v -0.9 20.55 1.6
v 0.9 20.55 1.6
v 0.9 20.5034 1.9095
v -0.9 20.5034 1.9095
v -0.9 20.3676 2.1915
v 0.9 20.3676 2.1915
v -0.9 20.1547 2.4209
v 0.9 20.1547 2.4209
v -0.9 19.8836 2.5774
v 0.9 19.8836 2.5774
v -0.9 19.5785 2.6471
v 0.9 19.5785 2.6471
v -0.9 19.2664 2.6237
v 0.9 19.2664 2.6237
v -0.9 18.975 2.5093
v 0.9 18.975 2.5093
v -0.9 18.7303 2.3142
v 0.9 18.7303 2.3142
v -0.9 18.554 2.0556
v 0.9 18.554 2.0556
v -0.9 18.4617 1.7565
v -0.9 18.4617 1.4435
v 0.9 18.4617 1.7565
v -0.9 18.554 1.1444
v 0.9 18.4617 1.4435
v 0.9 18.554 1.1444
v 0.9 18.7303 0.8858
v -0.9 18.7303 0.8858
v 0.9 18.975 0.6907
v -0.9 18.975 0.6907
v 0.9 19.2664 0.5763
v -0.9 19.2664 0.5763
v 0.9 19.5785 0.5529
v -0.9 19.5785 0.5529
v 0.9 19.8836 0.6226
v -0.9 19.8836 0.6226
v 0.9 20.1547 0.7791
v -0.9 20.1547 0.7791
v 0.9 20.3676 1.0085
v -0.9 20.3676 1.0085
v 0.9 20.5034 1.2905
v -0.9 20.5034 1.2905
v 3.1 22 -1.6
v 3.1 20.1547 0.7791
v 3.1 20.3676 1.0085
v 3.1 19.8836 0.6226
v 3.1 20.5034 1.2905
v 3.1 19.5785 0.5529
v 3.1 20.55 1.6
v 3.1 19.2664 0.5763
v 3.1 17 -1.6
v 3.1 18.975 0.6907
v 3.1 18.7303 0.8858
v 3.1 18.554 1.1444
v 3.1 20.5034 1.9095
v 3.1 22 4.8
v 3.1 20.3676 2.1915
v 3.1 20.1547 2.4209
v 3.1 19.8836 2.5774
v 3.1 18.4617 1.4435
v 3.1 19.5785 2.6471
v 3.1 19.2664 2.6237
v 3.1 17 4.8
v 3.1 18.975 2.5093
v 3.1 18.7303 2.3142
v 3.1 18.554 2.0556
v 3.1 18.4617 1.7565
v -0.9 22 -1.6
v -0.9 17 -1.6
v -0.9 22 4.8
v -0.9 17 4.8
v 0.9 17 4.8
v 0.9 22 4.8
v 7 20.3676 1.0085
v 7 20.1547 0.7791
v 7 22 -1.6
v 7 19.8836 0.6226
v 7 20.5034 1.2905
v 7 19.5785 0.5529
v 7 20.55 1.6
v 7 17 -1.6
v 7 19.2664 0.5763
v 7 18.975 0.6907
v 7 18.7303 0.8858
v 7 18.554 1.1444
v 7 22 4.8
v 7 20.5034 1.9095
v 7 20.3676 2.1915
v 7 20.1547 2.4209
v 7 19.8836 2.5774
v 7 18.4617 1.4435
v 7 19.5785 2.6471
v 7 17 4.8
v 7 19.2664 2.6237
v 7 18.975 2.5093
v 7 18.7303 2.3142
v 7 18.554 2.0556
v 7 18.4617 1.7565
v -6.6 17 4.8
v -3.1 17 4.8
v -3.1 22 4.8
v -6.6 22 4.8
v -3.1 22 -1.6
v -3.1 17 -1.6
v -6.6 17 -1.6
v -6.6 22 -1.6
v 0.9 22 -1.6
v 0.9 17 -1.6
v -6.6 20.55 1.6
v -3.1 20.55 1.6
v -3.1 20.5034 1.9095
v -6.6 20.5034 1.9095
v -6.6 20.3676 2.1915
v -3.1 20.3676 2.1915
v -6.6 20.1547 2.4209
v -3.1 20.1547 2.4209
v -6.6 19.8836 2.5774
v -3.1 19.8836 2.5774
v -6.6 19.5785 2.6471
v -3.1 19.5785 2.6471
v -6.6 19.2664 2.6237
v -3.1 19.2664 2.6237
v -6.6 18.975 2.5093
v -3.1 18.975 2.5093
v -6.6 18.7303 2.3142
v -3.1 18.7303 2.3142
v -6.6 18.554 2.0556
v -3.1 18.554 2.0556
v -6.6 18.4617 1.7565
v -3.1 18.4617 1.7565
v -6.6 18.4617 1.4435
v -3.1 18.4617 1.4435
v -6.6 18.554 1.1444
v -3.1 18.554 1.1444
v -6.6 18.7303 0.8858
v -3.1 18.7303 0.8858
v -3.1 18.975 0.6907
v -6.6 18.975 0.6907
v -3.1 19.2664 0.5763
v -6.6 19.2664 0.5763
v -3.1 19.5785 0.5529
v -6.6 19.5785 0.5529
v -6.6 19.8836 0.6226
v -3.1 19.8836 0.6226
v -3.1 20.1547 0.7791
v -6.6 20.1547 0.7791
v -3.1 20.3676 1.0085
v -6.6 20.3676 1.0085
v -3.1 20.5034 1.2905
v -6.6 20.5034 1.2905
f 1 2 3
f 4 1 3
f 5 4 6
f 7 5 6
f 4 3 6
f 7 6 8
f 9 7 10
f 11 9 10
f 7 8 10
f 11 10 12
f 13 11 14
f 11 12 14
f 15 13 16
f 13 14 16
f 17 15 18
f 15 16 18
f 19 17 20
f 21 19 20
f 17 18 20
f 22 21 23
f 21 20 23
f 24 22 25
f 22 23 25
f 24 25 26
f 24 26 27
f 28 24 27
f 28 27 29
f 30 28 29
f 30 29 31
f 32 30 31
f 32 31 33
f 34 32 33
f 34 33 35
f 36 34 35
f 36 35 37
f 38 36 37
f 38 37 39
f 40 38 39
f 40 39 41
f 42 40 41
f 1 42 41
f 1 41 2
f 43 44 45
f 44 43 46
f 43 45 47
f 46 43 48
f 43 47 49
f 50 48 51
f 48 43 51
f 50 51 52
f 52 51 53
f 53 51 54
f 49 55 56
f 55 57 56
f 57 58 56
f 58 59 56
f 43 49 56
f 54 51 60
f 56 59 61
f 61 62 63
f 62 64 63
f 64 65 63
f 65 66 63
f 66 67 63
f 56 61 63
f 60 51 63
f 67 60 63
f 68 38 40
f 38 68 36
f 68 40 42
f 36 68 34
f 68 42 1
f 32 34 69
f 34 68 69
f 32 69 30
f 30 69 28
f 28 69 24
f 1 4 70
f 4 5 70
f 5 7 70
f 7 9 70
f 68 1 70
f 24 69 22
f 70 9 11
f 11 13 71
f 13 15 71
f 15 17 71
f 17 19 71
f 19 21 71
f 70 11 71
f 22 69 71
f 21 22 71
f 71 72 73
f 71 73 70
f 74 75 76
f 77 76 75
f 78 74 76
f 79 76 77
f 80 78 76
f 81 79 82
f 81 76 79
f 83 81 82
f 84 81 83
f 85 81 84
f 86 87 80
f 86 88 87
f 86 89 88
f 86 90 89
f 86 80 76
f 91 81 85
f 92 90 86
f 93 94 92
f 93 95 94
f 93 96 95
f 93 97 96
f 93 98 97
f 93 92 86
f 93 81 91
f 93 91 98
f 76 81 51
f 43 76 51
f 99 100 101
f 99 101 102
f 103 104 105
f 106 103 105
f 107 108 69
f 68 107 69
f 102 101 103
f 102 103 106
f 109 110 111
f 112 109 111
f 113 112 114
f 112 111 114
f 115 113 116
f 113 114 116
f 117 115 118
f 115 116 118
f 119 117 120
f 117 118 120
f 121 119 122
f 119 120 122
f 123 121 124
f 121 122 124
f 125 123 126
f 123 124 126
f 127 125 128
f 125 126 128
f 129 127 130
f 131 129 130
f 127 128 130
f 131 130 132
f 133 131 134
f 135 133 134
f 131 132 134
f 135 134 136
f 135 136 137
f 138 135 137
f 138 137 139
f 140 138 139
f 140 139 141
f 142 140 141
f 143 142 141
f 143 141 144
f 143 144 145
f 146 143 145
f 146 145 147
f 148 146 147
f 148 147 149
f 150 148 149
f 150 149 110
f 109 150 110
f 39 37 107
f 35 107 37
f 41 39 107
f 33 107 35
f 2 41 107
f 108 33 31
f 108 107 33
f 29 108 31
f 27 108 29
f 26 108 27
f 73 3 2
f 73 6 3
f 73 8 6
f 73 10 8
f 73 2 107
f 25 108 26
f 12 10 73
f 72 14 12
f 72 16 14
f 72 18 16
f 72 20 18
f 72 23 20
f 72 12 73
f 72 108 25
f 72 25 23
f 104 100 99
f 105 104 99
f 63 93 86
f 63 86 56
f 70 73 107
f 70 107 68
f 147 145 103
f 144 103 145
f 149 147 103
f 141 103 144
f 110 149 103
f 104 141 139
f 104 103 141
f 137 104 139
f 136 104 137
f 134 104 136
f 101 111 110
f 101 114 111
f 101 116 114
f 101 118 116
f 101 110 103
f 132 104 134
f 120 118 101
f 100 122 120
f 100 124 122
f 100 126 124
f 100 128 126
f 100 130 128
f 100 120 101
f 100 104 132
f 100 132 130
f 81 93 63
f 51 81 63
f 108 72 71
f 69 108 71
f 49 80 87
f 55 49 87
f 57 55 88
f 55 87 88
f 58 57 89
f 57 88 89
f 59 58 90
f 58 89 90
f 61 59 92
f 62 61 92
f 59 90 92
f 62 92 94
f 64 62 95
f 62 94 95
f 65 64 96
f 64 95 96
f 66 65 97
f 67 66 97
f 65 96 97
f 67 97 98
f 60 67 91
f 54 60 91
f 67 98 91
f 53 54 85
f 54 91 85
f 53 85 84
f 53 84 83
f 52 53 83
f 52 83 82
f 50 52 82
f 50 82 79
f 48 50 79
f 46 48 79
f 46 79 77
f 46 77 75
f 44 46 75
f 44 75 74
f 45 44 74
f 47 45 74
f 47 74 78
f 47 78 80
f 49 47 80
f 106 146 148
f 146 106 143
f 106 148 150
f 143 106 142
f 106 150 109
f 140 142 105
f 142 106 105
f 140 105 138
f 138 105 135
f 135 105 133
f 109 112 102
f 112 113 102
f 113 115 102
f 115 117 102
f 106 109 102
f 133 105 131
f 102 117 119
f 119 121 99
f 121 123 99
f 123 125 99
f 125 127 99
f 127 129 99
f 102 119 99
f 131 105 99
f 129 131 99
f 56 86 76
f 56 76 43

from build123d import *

# Parameters (mm, degrees)
SKETCH018_R                            = 1.05
EXTRUDE001_DEPTH                       = 13.6
SKETCH017_AS_DRAWN_W                   = 1.8
SKETCH017_AS_DRAWN_H                   = 6.4
SKETCH017_AS_DRAWN_W_2                 = 3.9
SKETCH017_AS_DRAWN_W_3                 = 3.5
EXTRUDE_DEPTH                          = 5
EXTRUDE_ONTO_SKETCH017_ROLL_ANGLE      = 90
EXTRUDE_ONTO_SKETCH017_PLACEMENT_ANGLE = -180


with BuildPart() as extrude001:
    # Sketch018 (on Face2 of BaseFeature) → Extrude001 (new body)
    with BuildSketch(Plane.YZ.offset(7)):
        with Locations((19.5, 1.6)):
            Circle(SKETCH018_R)
    extrude(amount=-EXTRUDE001_DEPTH)


with BuildPart() as body:
    # Sketch017 as drawn → Extrude (new)
    with BuildSketch(Plane.XY):
        with Locations((0, 1.6)):
            Rectangle(SKETCH017_AS_DRAWN_W, SKETCH017_AS_DRAWN_H)
        with Locations((-5.05, 1.6)):
            Rectangle(SKETCH017_AS_DRAWN_W_2, SKETCH017_AS_DRAWN_H)
        with Locations((4.85, 1.6)):
            Rectangle(SKETCH017_AS_DRAWN_W_3, SKETCH017_AS_DRAWN_H)
    extrude(amount=EXTRUDE_DEPTH)


with BuildPart() as body_1:
    # Extrude onto Sketch017 roll: moved
    add(body.part.rotate(Axis((0, 0, 0), (1, 0, 0)), EXTRUDE_ONTO_SKETCH017_ROLL_ANGLE))


with BuildPart() as body_2:
    # Extrude onto Sketch017 placement: moved
    add(body_1.part.moved(Location((0, 17, 0))).rotate(Axis((0, 17, 0), (0, 0, 1)), EXTRUDE_ONTO_SKETCH017_PLACEMENT_ANGLE))

    # Cut: cut Extrude001
    add(extrude001.part, mode=Mode.SUBTRACT)


solid = body_2.part
